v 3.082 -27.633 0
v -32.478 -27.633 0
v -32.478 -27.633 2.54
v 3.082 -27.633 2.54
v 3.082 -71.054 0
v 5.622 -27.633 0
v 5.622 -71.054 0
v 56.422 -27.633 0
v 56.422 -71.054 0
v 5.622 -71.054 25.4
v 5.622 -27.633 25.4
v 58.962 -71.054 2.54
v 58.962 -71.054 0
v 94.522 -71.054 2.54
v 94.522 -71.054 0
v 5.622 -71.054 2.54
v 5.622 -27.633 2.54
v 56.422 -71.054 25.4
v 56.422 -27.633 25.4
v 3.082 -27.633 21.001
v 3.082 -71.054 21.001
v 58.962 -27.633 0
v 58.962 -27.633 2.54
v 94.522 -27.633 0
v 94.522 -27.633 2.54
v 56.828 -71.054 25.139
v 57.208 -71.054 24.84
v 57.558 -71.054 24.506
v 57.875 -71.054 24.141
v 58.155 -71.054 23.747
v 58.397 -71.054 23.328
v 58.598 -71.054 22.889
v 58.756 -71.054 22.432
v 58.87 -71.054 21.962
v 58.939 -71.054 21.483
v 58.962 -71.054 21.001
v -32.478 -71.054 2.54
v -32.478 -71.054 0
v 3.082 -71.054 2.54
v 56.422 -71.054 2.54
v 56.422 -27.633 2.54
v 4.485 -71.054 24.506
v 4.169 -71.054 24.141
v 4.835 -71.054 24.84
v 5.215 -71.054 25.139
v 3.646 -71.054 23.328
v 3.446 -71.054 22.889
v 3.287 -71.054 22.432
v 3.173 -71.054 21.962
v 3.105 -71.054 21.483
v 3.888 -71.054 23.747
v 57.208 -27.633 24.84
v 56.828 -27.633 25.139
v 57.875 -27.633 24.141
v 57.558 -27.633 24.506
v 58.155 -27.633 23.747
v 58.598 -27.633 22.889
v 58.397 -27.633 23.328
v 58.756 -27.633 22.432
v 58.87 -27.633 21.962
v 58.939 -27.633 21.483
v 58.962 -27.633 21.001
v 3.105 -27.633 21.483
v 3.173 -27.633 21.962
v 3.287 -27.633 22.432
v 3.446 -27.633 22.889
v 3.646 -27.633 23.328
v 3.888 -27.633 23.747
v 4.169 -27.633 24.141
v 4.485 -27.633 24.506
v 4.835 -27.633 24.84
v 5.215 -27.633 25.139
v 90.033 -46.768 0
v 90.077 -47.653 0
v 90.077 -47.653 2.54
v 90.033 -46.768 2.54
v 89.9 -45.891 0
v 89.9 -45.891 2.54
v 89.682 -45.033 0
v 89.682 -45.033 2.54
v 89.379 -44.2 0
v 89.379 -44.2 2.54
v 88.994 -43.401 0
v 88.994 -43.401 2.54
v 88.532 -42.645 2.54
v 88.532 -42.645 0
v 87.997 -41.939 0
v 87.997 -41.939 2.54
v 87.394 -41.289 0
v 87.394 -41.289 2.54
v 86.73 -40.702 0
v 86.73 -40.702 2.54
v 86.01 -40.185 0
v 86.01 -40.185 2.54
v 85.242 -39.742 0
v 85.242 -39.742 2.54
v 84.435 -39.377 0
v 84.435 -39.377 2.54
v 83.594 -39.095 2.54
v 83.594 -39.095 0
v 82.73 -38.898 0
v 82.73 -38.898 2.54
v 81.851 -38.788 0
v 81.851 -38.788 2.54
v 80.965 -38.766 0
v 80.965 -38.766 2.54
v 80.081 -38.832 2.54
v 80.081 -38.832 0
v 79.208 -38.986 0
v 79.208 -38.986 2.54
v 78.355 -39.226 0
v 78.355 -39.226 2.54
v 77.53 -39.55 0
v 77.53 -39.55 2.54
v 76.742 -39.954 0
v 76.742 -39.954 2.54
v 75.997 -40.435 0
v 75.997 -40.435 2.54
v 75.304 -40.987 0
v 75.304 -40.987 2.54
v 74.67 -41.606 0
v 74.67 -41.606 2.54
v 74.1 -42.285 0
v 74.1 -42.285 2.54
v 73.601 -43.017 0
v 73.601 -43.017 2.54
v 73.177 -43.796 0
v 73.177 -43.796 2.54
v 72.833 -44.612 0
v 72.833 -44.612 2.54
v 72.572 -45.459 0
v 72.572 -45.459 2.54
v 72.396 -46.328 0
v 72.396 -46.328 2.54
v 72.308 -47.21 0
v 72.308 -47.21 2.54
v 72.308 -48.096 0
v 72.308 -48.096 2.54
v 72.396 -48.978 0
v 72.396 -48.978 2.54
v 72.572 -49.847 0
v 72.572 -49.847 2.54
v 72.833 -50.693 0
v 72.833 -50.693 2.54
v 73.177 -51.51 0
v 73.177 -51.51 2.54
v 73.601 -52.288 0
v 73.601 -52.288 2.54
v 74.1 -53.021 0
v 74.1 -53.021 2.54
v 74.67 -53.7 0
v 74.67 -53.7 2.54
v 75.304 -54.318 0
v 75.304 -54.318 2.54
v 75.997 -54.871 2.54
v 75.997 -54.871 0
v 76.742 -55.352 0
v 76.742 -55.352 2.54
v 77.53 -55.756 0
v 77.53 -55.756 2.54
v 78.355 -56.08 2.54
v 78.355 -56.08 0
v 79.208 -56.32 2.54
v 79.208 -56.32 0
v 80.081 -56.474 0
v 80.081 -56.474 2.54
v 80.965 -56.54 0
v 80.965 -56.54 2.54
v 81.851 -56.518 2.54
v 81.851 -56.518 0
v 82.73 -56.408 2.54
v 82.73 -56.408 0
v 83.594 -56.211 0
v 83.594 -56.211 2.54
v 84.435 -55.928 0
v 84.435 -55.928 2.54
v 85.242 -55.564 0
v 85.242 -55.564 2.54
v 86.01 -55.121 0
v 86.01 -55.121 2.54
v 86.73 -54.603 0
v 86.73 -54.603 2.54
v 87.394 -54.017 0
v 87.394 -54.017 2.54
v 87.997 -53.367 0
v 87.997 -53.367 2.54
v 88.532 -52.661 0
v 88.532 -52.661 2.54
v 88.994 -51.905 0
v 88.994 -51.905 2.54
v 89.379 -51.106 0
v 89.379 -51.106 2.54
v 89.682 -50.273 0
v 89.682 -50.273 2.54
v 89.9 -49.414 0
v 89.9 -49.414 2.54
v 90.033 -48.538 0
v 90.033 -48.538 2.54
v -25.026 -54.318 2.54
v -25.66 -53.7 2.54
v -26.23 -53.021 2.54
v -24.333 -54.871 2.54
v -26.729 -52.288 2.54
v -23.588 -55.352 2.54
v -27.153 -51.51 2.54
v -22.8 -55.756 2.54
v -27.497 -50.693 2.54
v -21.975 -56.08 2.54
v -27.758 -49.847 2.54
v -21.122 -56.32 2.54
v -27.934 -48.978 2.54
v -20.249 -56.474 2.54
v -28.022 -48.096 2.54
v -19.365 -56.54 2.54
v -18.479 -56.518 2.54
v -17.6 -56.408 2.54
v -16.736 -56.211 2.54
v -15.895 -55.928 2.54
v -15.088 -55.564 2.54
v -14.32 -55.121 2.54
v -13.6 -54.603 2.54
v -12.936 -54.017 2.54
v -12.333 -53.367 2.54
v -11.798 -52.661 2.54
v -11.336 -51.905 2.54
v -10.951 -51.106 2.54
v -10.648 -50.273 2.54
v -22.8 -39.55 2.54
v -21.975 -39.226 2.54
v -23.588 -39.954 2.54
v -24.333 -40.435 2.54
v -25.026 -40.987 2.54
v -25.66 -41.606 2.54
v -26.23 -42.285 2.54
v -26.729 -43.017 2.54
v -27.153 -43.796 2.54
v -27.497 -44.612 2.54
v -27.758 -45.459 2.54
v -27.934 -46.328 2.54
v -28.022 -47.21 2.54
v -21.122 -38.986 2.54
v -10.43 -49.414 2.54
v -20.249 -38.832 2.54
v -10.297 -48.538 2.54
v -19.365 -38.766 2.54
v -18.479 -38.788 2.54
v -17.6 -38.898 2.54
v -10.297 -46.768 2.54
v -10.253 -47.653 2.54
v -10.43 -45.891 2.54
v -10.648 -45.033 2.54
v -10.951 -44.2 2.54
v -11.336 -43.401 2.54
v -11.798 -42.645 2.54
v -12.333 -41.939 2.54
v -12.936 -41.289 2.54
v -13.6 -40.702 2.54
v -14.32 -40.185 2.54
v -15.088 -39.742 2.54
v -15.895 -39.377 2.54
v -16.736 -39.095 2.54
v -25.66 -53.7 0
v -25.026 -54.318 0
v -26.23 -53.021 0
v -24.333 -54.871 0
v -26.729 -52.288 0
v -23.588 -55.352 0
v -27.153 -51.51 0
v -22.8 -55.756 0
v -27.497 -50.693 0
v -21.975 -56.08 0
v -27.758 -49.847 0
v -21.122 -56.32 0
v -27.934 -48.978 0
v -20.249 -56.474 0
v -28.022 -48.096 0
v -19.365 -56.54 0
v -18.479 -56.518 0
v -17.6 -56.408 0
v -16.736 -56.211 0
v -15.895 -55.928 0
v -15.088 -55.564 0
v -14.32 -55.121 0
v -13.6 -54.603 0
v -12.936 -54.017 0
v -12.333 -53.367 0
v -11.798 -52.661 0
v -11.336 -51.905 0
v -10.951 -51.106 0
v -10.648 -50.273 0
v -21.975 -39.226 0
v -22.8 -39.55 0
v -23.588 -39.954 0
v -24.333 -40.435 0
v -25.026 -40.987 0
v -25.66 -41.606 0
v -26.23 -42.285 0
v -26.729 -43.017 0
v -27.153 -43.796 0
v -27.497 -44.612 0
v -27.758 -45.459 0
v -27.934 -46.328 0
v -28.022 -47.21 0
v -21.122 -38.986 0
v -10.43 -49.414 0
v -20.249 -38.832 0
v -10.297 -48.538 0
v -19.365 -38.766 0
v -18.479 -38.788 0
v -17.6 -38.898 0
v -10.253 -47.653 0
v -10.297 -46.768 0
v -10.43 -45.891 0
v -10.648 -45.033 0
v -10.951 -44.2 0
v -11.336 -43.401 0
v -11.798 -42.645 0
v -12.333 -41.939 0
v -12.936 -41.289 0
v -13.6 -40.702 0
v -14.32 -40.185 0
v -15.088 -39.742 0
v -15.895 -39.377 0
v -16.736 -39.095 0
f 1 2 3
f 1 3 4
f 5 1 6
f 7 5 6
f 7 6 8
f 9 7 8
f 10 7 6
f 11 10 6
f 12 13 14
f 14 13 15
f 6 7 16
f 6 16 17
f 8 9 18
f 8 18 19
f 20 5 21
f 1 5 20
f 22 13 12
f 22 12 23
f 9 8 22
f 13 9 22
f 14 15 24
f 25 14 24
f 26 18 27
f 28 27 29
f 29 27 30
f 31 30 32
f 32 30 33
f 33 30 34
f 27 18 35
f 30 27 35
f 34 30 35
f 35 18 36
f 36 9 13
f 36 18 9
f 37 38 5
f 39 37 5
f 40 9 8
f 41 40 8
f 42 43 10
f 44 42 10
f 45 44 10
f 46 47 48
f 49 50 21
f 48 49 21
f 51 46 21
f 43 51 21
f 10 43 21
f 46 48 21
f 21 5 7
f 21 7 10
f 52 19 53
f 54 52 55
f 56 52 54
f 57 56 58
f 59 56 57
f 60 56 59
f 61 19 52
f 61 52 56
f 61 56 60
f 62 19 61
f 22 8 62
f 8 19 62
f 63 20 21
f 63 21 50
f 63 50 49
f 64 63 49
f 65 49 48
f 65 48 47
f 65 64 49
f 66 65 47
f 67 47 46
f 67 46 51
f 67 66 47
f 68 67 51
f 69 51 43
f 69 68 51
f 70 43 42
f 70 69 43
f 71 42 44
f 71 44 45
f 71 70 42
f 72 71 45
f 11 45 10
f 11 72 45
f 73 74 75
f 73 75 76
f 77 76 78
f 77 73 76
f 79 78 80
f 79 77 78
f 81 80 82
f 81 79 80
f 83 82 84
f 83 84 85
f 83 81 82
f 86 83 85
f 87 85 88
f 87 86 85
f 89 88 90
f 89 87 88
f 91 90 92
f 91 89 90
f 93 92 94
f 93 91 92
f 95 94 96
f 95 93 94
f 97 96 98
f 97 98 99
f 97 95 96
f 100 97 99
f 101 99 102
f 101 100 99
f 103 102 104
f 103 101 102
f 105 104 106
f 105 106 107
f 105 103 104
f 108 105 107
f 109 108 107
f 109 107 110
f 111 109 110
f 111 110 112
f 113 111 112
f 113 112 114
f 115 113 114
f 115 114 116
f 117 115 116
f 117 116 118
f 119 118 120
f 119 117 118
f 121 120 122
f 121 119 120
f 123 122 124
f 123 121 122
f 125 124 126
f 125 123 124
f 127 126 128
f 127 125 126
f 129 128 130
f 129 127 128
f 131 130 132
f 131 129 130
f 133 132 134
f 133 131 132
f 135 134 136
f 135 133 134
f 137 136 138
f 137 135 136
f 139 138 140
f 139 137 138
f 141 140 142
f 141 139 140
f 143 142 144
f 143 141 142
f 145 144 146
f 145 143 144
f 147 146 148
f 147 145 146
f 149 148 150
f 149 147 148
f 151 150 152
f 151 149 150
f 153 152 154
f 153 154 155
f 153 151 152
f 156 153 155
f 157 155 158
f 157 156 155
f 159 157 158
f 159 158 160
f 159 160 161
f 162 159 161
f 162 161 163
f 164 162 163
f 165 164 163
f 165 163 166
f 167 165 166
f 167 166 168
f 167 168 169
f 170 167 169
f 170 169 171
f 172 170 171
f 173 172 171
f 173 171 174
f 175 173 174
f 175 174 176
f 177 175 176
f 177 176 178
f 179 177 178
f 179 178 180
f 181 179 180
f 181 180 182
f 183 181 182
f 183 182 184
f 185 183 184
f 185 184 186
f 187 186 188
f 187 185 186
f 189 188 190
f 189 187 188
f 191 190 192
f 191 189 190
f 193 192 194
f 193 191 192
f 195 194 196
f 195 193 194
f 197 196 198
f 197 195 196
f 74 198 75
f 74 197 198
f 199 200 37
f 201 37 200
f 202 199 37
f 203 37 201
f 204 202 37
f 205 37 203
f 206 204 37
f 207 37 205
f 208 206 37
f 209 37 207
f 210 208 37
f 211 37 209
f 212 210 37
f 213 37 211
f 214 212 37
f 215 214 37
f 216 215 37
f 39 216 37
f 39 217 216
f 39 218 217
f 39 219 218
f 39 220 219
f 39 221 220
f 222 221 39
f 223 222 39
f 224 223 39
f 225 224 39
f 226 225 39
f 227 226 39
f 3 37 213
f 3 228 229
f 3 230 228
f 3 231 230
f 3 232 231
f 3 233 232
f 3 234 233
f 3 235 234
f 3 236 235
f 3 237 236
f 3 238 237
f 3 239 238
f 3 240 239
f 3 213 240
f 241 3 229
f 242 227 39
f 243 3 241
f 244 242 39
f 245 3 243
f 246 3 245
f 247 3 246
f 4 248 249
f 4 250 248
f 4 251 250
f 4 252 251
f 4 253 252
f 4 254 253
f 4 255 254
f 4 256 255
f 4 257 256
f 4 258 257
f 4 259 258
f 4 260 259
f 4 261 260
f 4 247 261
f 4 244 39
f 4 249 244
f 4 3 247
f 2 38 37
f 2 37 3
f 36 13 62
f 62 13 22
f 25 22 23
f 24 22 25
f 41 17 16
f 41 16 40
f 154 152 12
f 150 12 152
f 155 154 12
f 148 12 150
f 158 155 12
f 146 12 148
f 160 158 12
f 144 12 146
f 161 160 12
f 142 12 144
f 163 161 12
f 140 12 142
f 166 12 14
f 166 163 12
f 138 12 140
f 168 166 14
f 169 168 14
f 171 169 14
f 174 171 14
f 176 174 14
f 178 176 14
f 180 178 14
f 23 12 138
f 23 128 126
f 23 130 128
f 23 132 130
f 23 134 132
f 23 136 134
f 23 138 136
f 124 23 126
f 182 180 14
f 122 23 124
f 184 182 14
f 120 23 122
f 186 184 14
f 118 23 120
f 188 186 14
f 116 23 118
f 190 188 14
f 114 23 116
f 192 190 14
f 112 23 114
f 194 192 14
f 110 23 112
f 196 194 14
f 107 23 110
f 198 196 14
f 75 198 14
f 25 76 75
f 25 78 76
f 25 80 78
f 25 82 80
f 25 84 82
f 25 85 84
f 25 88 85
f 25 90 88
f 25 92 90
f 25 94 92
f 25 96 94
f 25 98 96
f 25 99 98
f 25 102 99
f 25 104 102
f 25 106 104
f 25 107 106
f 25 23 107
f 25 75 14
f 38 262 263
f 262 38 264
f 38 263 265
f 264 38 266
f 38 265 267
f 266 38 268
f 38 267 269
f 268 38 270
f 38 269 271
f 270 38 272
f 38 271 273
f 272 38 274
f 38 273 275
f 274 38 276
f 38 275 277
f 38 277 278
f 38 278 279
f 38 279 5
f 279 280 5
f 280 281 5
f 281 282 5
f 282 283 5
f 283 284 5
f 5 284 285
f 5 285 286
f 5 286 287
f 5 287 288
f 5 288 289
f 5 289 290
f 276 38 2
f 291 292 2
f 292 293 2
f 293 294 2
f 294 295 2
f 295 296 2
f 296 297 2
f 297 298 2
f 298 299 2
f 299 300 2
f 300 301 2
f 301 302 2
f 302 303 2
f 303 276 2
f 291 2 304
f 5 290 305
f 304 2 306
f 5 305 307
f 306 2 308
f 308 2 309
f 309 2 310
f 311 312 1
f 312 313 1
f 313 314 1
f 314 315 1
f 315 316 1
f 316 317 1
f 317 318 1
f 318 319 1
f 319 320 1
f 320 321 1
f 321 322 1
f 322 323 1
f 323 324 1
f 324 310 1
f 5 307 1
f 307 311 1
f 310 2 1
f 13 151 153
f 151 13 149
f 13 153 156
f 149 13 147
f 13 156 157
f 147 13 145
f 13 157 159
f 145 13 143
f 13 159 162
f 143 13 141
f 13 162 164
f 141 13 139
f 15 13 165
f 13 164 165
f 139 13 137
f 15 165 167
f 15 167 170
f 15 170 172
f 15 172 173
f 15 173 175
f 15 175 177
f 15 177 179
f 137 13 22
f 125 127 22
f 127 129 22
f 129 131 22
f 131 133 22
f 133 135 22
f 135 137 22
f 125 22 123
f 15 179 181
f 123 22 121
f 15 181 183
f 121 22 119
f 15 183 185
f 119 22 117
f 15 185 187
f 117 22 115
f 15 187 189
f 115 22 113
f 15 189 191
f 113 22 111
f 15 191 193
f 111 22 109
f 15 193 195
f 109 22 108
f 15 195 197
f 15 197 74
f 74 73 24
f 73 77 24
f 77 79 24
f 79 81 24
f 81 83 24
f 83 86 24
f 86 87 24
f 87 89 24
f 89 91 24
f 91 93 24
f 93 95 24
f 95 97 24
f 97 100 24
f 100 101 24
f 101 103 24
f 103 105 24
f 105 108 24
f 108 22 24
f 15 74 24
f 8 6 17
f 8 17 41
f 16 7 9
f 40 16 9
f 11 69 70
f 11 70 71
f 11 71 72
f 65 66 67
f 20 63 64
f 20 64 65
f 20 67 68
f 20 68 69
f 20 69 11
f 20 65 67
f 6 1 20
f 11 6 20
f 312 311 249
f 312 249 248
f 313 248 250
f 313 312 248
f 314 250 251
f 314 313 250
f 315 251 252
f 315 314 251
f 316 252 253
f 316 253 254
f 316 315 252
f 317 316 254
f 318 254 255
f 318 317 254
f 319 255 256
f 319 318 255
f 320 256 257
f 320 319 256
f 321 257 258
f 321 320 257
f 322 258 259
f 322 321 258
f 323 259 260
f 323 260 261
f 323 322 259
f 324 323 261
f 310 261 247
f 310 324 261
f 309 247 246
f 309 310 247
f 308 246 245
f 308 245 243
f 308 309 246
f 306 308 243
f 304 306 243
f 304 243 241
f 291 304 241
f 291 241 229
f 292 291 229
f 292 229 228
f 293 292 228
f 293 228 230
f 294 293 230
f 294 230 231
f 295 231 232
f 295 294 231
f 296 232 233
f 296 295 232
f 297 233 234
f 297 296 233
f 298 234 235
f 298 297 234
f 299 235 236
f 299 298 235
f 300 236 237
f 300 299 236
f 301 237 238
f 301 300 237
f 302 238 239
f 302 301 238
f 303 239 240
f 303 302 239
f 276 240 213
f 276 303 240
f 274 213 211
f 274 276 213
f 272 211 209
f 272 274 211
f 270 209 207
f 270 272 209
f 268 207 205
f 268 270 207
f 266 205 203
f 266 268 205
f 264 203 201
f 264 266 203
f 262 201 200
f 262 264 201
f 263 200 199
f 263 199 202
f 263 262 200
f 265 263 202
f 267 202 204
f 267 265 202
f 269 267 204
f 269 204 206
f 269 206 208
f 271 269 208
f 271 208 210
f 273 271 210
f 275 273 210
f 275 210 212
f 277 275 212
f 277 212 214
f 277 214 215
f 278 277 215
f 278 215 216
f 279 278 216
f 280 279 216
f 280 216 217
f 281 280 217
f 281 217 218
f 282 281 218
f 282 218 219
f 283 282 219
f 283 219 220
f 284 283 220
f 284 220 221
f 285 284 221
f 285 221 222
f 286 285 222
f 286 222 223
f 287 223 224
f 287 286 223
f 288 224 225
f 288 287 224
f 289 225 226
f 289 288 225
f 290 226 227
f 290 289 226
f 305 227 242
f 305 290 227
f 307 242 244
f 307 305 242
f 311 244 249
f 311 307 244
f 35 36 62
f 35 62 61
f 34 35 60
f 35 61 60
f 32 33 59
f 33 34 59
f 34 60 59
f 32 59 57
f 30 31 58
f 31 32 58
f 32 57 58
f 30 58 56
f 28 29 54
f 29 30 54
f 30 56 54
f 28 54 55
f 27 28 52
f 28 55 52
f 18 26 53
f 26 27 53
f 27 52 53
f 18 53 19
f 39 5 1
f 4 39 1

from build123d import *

# Parameters (mm, degrees)
F0_W          = 2.54
F0_H          = 43.4209238519
F1_DEPTH      = 25.4
F0_W_2        = 35.56
F0_R          = 8.89
F2_DEPTH      = 2.54
F0_W_3        = 50.8
F3_T1_DEPTH   = 65.417969108
F3_2_T1_DEPTH = 65.417969108


# Not quite as in the source:
# - a fillet or chamfer that OpenCascade refuses, or shapes differently, is made with other operations: its cross-section is extruded or revolved along the edge and cut away or added


with BuildPart() as f1:
    # F0 (on Top) → F1 (new body)
    with BuildSketch(Plane.XY):
        with Locations((4.3516923602, -49.3432171643)):
            Rectangle(F0_W, F0_H)
    extrude(amount=F1_DEPTH)

    # F3: fillet of radius 5.08 on 1 edges, made by hand

    # F3_s2 → F3_t1 (cut)
    with BuildSketch(Plane.XZ.offset(16.6342326103)):
        with BuildLine():
            ThreePointArc((3.0816923602, 21.0005909488), (3.762283309, 23.5405909488), (5.6216923602, 25.4))
            Line((5.6216923602, 25.4), (3.0816923602, 25.4))
            Line((3.0816923602, 25.4), (3.0816923602, 21.0005909488))
        make_face()
    extrude(amount=F3_T1_DEPTH, mode=Mode.SUBTRACT)


with BuildPart() as f1b:
    # F0 (on Top) → F1, piece 2 (new body)
    with BuildSketch(Plane.XY):
        with Locations((57.6916923602, -49.3432171643)):
            Rectangle(F0_W, F0_H)
    extrude(amount=F1_DEPTH)

    # F3#2: fillet of radius 5.08 on 1 edges, made by hand

    # F3_2_s2 → F3_2_t1 (cut)
    with BuildSketch(Plane.XZ.offset(16.6342326103)):
        with BuildLine():
            ThreePointArc((58.9616923602, 21.0005909488), (58.2811014114, 23.5405909488), (56.4216923602, 25.4))
            Line((56.4216923602, 25.4), (58.9616923602, 25.4))
            Line((58.9616923602, 25.4), (58.9616923602, 21.0005909488))
        make_face()
    extrude(amount=F3_2_T1_DEPTH, mode=Mode.SUBTRACT)


with BuildPart() as f2:
    # F0 (on Top) → F2 (new body)
    with BuildSketch(Plane.XY):
        with Locations((-14.6983076398, -49.3432171643)):
            Rectangle(F0_W_2, F0_H)
        with Locations((-19.1433076398, -47.6529405909)):
            Circle(F0_R, mode=Mode.SUBTRACT)
    extrude(amount=F2_DEPTH)


with BuildPart() as f2b:
    # F0 (on Top) → F2, piece 2 (new body)
    with BuildSketch(Plane.XY):
        with Locations((31.0216923602, -49.3432171643)):
            Rectangle(F0_W_3, F0_H)
    extrude(amount=F2_DEPTH)


with BuildPart() as f2c:
    # F0 (on Top) → F2, piece 3 (new body)
    with BuildSketch(Plane.XY):
        with Locations((76.7416923602, -49.3432171643)):
            Rectangle(F0_W_2, F0_H)
        with Locations((81.1866923602, -47.6529405909)):
            Circle(F0_R, mode=Mode.SUBTRACT)
    extrude(amount=F2_DEPTH)


solid = Compound([f1.part, f1b.part, f2.part, f2b.part, f2c.part])
